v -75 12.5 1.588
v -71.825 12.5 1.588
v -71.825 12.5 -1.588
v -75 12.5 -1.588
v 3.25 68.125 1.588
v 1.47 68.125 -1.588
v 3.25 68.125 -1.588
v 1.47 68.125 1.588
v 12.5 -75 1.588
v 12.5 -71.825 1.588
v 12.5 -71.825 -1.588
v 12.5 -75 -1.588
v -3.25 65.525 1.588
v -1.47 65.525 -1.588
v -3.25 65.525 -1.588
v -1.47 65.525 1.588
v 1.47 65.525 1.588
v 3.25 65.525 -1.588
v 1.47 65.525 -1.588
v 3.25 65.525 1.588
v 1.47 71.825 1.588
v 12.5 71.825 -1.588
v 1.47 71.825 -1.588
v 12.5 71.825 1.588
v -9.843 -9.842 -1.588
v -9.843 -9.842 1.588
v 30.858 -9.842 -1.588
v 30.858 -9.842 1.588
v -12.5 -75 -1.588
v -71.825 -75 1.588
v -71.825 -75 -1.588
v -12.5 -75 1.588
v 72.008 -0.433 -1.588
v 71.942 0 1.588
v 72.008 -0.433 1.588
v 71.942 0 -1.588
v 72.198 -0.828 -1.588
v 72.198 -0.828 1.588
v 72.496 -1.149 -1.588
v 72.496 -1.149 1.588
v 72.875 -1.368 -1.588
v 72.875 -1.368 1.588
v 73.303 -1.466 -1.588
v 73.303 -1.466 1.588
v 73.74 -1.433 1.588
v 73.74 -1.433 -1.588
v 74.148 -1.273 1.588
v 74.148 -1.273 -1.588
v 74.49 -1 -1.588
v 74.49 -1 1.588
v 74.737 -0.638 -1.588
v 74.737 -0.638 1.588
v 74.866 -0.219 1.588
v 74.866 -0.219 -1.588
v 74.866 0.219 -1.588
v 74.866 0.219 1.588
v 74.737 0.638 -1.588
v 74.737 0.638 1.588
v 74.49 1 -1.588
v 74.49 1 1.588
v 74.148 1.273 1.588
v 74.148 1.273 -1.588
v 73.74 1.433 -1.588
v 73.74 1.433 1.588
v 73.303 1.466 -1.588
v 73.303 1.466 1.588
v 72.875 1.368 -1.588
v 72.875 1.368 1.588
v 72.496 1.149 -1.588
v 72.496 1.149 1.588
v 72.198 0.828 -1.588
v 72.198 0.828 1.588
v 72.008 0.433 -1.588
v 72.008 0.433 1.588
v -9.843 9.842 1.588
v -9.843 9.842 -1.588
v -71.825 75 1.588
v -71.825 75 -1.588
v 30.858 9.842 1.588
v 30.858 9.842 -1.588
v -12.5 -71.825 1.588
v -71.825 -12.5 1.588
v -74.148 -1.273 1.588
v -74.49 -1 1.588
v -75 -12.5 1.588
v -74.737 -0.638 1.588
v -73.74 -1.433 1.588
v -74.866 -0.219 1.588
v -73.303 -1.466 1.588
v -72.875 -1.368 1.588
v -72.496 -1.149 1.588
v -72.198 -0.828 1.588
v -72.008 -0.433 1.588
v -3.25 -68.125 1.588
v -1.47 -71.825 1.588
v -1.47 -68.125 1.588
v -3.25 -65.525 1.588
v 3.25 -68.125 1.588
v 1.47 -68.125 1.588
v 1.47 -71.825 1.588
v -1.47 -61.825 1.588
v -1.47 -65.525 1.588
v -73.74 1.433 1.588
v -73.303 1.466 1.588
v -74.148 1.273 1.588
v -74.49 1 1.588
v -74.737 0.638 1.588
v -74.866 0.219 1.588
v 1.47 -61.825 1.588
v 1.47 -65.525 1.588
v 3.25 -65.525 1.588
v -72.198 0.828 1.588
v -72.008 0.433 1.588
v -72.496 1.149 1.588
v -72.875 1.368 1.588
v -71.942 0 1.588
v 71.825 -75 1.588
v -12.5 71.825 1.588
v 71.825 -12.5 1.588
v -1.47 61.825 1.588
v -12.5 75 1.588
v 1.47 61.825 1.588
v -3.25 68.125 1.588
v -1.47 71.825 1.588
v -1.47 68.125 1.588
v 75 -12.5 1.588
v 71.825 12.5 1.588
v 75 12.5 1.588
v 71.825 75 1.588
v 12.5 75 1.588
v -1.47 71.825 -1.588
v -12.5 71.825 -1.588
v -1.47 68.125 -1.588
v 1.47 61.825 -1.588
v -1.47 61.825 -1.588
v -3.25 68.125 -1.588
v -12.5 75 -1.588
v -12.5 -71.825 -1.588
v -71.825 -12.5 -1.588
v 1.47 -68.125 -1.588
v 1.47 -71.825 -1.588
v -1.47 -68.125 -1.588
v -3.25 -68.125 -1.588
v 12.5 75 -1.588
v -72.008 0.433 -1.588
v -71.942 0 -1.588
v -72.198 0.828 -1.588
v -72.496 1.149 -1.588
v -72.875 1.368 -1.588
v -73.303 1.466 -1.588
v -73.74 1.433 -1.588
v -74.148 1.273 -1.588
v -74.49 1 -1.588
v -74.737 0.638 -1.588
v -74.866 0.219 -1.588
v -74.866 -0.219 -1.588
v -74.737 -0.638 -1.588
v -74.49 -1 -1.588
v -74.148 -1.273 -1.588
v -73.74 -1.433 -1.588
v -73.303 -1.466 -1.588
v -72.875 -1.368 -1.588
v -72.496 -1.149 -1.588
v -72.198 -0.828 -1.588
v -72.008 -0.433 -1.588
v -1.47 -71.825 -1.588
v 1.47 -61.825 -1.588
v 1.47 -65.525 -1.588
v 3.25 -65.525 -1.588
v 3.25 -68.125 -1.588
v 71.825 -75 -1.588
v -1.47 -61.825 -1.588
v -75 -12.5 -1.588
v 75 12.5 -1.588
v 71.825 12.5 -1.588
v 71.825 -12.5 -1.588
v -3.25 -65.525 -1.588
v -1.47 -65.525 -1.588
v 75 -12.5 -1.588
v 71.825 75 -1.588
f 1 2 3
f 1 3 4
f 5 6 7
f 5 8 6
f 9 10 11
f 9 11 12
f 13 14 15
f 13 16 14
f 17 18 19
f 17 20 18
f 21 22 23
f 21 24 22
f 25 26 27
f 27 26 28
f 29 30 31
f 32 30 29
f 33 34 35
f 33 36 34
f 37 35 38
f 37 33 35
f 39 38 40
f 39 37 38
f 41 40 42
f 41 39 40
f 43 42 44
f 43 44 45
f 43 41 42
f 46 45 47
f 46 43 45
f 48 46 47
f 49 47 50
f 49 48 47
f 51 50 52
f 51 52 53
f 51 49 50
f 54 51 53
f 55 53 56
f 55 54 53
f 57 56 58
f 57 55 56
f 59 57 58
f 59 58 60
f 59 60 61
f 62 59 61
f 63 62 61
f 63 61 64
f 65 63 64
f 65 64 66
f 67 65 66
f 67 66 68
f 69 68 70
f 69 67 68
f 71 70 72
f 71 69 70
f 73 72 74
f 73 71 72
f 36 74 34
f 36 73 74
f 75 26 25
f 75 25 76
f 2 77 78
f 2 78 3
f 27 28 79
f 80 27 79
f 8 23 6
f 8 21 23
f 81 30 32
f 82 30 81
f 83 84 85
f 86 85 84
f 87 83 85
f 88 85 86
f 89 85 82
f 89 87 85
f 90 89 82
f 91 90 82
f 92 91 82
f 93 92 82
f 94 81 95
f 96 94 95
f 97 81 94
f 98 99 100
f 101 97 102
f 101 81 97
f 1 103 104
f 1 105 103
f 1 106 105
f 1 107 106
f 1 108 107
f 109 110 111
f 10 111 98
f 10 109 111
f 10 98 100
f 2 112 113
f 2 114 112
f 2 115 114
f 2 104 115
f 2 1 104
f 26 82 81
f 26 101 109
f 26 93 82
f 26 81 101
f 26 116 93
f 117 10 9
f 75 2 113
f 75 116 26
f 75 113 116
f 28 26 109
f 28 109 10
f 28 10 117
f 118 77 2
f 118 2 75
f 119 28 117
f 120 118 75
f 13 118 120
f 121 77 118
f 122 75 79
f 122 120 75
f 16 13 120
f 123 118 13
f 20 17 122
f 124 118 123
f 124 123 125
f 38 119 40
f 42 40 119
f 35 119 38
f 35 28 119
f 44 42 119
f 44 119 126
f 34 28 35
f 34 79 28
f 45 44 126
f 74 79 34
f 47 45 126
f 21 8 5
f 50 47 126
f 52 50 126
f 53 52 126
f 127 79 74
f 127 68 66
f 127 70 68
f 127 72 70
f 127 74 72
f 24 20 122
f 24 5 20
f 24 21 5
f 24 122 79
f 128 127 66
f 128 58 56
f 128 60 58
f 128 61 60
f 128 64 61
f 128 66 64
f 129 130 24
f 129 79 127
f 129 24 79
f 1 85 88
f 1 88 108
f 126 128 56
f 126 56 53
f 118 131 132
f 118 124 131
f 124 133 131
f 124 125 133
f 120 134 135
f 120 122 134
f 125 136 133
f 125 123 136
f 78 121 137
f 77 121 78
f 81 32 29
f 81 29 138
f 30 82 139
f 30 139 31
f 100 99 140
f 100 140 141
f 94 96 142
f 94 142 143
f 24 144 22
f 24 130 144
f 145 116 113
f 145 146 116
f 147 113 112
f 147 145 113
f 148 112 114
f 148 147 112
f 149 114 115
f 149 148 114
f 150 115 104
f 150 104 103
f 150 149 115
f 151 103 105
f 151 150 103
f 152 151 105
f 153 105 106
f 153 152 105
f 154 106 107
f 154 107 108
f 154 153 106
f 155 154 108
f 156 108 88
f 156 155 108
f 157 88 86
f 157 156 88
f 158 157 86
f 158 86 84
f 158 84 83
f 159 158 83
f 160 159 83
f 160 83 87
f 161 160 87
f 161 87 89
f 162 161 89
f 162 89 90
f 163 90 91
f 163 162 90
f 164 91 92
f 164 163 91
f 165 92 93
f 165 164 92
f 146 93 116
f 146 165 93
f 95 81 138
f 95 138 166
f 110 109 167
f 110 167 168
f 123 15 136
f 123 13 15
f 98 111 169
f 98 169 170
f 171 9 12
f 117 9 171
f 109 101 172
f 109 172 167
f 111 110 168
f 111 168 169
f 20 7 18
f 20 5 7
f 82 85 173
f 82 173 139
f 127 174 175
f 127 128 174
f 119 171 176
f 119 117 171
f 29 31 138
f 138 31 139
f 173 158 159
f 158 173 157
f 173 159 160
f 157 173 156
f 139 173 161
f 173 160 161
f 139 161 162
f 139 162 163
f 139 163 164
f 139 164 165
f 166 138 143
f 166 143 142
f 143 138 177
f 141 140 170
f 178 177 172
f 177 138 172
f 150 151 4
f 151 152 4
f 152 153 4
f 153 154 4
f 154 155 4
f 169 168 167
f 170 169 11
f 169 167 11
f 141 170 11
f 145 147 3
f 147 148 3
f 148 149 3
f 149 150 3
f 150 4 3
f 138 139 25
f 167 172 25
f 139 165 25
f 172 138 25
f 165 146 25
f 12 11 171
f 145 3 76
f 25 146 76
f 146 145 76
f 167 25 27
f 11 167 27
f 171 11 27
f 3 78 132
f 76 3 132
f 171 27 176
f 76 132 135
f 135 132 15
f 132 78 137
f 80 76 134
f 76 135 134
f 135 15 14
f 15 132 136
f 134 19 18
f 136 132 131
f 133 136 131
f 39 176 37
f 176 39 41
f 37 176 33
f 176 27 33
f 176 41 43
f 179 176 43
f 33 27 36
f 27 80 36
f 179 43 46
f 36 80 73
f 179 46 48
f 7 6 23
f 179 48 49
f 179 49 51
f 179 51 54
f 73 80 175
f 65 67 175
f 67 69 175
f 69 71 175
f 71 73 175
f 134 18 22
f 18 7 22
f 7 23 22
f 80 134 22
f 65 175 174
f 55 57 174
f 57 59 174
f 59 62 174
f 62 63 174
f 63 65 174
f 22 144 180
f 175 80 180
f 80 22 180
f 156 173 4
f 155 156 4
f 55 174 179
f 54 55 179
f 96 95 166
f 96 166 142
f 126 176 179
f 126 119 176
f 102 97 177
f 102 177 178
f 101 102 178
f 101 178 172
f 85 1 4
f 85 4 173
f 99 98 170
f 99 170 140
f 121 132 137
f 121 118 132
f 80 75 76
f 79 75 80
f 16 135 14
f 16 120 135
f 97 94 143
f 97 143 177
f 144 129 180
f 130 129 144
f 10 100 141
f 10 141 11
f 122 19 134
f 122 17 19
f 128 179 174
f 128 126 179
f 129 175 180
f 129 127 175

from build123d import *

# Parameters (mm, degrees)
SKETCH1_R           = 1.47
BOSS_EXTRUDE1_DEPTH = 1.5875
SKETCH2_W           = 40.7
SKETCH2_H           = 19.685
CUT_EXTRUDE1_DEPTH  = 107.113527059


with BuildPart() as part:
    # Sketch1 → Boss-Extrude1 (new, symmetric)
    with BuildSketch(Plane.XY):
        Polygon((-12.5, 75), (-71.825, 75), (-71.825, 12.5), (-75, 12.5), (-75, -12.5), (-71.825, -12.5), (-71.825, -75), (-12.5, -75), (-12.5, -71.825), (-1.47, -71.825), (-1.47, -68.125), (-3.25, -68.125), (-3.25, -65.525), (-1.47, -65.525), (-1.47, -61.825), (1.47, -61.825), (1.47, -65.525), (3.25, -65.525), (3.25, -68.125), (1.47, -68.125), (1.47, -71.825), (12.5, -71.825), (12.5, -75), (71.825, -75), (71.825, -12.5), (75, -12.5), (75, 12.5), (71.825, 12.5), (71.825, 75), (12.5, 75), (12.5, 71.825), (1.47, 71.825), (1.47, 68.125), (3.25, 68.125), (3.25, 65.525), (1.47, 65.525), (1.47, 61.825), (-1.47, 61.825), (-1.47, 65.525), (-3.25, 65.525), (-3.25, 68.125), (-1.47, 68.125), (-1.47, 71.825), (-12.5, 71.825), align=None)
        with Locations((-73.4125, 0)):
            Circle(SKETCH1_R, mode=Mode.SUBTRACT)
        with Locations(Location((73.4125, 0, 0), (0, 0, 180))):
            Circle(SKETCH1_R, mode=Mode.SUBTRACT)
    extrude(amount=BOSS_EXTRUDE1_DEPTH, both=True)

    # Sketch2 → Cut-Extrude1 (cut, through all)
    with BuildSketch(Plane.XY.offset(1.5875)):
        with Locations((10.5075, 0)):
            Rectangle(SKETCH2_W, SKETCH2_H)
    extrude(amount=-CUT_EXTRUDE1_DEPTH, mode=Mode.SUBTRACT)


solid = part.part
